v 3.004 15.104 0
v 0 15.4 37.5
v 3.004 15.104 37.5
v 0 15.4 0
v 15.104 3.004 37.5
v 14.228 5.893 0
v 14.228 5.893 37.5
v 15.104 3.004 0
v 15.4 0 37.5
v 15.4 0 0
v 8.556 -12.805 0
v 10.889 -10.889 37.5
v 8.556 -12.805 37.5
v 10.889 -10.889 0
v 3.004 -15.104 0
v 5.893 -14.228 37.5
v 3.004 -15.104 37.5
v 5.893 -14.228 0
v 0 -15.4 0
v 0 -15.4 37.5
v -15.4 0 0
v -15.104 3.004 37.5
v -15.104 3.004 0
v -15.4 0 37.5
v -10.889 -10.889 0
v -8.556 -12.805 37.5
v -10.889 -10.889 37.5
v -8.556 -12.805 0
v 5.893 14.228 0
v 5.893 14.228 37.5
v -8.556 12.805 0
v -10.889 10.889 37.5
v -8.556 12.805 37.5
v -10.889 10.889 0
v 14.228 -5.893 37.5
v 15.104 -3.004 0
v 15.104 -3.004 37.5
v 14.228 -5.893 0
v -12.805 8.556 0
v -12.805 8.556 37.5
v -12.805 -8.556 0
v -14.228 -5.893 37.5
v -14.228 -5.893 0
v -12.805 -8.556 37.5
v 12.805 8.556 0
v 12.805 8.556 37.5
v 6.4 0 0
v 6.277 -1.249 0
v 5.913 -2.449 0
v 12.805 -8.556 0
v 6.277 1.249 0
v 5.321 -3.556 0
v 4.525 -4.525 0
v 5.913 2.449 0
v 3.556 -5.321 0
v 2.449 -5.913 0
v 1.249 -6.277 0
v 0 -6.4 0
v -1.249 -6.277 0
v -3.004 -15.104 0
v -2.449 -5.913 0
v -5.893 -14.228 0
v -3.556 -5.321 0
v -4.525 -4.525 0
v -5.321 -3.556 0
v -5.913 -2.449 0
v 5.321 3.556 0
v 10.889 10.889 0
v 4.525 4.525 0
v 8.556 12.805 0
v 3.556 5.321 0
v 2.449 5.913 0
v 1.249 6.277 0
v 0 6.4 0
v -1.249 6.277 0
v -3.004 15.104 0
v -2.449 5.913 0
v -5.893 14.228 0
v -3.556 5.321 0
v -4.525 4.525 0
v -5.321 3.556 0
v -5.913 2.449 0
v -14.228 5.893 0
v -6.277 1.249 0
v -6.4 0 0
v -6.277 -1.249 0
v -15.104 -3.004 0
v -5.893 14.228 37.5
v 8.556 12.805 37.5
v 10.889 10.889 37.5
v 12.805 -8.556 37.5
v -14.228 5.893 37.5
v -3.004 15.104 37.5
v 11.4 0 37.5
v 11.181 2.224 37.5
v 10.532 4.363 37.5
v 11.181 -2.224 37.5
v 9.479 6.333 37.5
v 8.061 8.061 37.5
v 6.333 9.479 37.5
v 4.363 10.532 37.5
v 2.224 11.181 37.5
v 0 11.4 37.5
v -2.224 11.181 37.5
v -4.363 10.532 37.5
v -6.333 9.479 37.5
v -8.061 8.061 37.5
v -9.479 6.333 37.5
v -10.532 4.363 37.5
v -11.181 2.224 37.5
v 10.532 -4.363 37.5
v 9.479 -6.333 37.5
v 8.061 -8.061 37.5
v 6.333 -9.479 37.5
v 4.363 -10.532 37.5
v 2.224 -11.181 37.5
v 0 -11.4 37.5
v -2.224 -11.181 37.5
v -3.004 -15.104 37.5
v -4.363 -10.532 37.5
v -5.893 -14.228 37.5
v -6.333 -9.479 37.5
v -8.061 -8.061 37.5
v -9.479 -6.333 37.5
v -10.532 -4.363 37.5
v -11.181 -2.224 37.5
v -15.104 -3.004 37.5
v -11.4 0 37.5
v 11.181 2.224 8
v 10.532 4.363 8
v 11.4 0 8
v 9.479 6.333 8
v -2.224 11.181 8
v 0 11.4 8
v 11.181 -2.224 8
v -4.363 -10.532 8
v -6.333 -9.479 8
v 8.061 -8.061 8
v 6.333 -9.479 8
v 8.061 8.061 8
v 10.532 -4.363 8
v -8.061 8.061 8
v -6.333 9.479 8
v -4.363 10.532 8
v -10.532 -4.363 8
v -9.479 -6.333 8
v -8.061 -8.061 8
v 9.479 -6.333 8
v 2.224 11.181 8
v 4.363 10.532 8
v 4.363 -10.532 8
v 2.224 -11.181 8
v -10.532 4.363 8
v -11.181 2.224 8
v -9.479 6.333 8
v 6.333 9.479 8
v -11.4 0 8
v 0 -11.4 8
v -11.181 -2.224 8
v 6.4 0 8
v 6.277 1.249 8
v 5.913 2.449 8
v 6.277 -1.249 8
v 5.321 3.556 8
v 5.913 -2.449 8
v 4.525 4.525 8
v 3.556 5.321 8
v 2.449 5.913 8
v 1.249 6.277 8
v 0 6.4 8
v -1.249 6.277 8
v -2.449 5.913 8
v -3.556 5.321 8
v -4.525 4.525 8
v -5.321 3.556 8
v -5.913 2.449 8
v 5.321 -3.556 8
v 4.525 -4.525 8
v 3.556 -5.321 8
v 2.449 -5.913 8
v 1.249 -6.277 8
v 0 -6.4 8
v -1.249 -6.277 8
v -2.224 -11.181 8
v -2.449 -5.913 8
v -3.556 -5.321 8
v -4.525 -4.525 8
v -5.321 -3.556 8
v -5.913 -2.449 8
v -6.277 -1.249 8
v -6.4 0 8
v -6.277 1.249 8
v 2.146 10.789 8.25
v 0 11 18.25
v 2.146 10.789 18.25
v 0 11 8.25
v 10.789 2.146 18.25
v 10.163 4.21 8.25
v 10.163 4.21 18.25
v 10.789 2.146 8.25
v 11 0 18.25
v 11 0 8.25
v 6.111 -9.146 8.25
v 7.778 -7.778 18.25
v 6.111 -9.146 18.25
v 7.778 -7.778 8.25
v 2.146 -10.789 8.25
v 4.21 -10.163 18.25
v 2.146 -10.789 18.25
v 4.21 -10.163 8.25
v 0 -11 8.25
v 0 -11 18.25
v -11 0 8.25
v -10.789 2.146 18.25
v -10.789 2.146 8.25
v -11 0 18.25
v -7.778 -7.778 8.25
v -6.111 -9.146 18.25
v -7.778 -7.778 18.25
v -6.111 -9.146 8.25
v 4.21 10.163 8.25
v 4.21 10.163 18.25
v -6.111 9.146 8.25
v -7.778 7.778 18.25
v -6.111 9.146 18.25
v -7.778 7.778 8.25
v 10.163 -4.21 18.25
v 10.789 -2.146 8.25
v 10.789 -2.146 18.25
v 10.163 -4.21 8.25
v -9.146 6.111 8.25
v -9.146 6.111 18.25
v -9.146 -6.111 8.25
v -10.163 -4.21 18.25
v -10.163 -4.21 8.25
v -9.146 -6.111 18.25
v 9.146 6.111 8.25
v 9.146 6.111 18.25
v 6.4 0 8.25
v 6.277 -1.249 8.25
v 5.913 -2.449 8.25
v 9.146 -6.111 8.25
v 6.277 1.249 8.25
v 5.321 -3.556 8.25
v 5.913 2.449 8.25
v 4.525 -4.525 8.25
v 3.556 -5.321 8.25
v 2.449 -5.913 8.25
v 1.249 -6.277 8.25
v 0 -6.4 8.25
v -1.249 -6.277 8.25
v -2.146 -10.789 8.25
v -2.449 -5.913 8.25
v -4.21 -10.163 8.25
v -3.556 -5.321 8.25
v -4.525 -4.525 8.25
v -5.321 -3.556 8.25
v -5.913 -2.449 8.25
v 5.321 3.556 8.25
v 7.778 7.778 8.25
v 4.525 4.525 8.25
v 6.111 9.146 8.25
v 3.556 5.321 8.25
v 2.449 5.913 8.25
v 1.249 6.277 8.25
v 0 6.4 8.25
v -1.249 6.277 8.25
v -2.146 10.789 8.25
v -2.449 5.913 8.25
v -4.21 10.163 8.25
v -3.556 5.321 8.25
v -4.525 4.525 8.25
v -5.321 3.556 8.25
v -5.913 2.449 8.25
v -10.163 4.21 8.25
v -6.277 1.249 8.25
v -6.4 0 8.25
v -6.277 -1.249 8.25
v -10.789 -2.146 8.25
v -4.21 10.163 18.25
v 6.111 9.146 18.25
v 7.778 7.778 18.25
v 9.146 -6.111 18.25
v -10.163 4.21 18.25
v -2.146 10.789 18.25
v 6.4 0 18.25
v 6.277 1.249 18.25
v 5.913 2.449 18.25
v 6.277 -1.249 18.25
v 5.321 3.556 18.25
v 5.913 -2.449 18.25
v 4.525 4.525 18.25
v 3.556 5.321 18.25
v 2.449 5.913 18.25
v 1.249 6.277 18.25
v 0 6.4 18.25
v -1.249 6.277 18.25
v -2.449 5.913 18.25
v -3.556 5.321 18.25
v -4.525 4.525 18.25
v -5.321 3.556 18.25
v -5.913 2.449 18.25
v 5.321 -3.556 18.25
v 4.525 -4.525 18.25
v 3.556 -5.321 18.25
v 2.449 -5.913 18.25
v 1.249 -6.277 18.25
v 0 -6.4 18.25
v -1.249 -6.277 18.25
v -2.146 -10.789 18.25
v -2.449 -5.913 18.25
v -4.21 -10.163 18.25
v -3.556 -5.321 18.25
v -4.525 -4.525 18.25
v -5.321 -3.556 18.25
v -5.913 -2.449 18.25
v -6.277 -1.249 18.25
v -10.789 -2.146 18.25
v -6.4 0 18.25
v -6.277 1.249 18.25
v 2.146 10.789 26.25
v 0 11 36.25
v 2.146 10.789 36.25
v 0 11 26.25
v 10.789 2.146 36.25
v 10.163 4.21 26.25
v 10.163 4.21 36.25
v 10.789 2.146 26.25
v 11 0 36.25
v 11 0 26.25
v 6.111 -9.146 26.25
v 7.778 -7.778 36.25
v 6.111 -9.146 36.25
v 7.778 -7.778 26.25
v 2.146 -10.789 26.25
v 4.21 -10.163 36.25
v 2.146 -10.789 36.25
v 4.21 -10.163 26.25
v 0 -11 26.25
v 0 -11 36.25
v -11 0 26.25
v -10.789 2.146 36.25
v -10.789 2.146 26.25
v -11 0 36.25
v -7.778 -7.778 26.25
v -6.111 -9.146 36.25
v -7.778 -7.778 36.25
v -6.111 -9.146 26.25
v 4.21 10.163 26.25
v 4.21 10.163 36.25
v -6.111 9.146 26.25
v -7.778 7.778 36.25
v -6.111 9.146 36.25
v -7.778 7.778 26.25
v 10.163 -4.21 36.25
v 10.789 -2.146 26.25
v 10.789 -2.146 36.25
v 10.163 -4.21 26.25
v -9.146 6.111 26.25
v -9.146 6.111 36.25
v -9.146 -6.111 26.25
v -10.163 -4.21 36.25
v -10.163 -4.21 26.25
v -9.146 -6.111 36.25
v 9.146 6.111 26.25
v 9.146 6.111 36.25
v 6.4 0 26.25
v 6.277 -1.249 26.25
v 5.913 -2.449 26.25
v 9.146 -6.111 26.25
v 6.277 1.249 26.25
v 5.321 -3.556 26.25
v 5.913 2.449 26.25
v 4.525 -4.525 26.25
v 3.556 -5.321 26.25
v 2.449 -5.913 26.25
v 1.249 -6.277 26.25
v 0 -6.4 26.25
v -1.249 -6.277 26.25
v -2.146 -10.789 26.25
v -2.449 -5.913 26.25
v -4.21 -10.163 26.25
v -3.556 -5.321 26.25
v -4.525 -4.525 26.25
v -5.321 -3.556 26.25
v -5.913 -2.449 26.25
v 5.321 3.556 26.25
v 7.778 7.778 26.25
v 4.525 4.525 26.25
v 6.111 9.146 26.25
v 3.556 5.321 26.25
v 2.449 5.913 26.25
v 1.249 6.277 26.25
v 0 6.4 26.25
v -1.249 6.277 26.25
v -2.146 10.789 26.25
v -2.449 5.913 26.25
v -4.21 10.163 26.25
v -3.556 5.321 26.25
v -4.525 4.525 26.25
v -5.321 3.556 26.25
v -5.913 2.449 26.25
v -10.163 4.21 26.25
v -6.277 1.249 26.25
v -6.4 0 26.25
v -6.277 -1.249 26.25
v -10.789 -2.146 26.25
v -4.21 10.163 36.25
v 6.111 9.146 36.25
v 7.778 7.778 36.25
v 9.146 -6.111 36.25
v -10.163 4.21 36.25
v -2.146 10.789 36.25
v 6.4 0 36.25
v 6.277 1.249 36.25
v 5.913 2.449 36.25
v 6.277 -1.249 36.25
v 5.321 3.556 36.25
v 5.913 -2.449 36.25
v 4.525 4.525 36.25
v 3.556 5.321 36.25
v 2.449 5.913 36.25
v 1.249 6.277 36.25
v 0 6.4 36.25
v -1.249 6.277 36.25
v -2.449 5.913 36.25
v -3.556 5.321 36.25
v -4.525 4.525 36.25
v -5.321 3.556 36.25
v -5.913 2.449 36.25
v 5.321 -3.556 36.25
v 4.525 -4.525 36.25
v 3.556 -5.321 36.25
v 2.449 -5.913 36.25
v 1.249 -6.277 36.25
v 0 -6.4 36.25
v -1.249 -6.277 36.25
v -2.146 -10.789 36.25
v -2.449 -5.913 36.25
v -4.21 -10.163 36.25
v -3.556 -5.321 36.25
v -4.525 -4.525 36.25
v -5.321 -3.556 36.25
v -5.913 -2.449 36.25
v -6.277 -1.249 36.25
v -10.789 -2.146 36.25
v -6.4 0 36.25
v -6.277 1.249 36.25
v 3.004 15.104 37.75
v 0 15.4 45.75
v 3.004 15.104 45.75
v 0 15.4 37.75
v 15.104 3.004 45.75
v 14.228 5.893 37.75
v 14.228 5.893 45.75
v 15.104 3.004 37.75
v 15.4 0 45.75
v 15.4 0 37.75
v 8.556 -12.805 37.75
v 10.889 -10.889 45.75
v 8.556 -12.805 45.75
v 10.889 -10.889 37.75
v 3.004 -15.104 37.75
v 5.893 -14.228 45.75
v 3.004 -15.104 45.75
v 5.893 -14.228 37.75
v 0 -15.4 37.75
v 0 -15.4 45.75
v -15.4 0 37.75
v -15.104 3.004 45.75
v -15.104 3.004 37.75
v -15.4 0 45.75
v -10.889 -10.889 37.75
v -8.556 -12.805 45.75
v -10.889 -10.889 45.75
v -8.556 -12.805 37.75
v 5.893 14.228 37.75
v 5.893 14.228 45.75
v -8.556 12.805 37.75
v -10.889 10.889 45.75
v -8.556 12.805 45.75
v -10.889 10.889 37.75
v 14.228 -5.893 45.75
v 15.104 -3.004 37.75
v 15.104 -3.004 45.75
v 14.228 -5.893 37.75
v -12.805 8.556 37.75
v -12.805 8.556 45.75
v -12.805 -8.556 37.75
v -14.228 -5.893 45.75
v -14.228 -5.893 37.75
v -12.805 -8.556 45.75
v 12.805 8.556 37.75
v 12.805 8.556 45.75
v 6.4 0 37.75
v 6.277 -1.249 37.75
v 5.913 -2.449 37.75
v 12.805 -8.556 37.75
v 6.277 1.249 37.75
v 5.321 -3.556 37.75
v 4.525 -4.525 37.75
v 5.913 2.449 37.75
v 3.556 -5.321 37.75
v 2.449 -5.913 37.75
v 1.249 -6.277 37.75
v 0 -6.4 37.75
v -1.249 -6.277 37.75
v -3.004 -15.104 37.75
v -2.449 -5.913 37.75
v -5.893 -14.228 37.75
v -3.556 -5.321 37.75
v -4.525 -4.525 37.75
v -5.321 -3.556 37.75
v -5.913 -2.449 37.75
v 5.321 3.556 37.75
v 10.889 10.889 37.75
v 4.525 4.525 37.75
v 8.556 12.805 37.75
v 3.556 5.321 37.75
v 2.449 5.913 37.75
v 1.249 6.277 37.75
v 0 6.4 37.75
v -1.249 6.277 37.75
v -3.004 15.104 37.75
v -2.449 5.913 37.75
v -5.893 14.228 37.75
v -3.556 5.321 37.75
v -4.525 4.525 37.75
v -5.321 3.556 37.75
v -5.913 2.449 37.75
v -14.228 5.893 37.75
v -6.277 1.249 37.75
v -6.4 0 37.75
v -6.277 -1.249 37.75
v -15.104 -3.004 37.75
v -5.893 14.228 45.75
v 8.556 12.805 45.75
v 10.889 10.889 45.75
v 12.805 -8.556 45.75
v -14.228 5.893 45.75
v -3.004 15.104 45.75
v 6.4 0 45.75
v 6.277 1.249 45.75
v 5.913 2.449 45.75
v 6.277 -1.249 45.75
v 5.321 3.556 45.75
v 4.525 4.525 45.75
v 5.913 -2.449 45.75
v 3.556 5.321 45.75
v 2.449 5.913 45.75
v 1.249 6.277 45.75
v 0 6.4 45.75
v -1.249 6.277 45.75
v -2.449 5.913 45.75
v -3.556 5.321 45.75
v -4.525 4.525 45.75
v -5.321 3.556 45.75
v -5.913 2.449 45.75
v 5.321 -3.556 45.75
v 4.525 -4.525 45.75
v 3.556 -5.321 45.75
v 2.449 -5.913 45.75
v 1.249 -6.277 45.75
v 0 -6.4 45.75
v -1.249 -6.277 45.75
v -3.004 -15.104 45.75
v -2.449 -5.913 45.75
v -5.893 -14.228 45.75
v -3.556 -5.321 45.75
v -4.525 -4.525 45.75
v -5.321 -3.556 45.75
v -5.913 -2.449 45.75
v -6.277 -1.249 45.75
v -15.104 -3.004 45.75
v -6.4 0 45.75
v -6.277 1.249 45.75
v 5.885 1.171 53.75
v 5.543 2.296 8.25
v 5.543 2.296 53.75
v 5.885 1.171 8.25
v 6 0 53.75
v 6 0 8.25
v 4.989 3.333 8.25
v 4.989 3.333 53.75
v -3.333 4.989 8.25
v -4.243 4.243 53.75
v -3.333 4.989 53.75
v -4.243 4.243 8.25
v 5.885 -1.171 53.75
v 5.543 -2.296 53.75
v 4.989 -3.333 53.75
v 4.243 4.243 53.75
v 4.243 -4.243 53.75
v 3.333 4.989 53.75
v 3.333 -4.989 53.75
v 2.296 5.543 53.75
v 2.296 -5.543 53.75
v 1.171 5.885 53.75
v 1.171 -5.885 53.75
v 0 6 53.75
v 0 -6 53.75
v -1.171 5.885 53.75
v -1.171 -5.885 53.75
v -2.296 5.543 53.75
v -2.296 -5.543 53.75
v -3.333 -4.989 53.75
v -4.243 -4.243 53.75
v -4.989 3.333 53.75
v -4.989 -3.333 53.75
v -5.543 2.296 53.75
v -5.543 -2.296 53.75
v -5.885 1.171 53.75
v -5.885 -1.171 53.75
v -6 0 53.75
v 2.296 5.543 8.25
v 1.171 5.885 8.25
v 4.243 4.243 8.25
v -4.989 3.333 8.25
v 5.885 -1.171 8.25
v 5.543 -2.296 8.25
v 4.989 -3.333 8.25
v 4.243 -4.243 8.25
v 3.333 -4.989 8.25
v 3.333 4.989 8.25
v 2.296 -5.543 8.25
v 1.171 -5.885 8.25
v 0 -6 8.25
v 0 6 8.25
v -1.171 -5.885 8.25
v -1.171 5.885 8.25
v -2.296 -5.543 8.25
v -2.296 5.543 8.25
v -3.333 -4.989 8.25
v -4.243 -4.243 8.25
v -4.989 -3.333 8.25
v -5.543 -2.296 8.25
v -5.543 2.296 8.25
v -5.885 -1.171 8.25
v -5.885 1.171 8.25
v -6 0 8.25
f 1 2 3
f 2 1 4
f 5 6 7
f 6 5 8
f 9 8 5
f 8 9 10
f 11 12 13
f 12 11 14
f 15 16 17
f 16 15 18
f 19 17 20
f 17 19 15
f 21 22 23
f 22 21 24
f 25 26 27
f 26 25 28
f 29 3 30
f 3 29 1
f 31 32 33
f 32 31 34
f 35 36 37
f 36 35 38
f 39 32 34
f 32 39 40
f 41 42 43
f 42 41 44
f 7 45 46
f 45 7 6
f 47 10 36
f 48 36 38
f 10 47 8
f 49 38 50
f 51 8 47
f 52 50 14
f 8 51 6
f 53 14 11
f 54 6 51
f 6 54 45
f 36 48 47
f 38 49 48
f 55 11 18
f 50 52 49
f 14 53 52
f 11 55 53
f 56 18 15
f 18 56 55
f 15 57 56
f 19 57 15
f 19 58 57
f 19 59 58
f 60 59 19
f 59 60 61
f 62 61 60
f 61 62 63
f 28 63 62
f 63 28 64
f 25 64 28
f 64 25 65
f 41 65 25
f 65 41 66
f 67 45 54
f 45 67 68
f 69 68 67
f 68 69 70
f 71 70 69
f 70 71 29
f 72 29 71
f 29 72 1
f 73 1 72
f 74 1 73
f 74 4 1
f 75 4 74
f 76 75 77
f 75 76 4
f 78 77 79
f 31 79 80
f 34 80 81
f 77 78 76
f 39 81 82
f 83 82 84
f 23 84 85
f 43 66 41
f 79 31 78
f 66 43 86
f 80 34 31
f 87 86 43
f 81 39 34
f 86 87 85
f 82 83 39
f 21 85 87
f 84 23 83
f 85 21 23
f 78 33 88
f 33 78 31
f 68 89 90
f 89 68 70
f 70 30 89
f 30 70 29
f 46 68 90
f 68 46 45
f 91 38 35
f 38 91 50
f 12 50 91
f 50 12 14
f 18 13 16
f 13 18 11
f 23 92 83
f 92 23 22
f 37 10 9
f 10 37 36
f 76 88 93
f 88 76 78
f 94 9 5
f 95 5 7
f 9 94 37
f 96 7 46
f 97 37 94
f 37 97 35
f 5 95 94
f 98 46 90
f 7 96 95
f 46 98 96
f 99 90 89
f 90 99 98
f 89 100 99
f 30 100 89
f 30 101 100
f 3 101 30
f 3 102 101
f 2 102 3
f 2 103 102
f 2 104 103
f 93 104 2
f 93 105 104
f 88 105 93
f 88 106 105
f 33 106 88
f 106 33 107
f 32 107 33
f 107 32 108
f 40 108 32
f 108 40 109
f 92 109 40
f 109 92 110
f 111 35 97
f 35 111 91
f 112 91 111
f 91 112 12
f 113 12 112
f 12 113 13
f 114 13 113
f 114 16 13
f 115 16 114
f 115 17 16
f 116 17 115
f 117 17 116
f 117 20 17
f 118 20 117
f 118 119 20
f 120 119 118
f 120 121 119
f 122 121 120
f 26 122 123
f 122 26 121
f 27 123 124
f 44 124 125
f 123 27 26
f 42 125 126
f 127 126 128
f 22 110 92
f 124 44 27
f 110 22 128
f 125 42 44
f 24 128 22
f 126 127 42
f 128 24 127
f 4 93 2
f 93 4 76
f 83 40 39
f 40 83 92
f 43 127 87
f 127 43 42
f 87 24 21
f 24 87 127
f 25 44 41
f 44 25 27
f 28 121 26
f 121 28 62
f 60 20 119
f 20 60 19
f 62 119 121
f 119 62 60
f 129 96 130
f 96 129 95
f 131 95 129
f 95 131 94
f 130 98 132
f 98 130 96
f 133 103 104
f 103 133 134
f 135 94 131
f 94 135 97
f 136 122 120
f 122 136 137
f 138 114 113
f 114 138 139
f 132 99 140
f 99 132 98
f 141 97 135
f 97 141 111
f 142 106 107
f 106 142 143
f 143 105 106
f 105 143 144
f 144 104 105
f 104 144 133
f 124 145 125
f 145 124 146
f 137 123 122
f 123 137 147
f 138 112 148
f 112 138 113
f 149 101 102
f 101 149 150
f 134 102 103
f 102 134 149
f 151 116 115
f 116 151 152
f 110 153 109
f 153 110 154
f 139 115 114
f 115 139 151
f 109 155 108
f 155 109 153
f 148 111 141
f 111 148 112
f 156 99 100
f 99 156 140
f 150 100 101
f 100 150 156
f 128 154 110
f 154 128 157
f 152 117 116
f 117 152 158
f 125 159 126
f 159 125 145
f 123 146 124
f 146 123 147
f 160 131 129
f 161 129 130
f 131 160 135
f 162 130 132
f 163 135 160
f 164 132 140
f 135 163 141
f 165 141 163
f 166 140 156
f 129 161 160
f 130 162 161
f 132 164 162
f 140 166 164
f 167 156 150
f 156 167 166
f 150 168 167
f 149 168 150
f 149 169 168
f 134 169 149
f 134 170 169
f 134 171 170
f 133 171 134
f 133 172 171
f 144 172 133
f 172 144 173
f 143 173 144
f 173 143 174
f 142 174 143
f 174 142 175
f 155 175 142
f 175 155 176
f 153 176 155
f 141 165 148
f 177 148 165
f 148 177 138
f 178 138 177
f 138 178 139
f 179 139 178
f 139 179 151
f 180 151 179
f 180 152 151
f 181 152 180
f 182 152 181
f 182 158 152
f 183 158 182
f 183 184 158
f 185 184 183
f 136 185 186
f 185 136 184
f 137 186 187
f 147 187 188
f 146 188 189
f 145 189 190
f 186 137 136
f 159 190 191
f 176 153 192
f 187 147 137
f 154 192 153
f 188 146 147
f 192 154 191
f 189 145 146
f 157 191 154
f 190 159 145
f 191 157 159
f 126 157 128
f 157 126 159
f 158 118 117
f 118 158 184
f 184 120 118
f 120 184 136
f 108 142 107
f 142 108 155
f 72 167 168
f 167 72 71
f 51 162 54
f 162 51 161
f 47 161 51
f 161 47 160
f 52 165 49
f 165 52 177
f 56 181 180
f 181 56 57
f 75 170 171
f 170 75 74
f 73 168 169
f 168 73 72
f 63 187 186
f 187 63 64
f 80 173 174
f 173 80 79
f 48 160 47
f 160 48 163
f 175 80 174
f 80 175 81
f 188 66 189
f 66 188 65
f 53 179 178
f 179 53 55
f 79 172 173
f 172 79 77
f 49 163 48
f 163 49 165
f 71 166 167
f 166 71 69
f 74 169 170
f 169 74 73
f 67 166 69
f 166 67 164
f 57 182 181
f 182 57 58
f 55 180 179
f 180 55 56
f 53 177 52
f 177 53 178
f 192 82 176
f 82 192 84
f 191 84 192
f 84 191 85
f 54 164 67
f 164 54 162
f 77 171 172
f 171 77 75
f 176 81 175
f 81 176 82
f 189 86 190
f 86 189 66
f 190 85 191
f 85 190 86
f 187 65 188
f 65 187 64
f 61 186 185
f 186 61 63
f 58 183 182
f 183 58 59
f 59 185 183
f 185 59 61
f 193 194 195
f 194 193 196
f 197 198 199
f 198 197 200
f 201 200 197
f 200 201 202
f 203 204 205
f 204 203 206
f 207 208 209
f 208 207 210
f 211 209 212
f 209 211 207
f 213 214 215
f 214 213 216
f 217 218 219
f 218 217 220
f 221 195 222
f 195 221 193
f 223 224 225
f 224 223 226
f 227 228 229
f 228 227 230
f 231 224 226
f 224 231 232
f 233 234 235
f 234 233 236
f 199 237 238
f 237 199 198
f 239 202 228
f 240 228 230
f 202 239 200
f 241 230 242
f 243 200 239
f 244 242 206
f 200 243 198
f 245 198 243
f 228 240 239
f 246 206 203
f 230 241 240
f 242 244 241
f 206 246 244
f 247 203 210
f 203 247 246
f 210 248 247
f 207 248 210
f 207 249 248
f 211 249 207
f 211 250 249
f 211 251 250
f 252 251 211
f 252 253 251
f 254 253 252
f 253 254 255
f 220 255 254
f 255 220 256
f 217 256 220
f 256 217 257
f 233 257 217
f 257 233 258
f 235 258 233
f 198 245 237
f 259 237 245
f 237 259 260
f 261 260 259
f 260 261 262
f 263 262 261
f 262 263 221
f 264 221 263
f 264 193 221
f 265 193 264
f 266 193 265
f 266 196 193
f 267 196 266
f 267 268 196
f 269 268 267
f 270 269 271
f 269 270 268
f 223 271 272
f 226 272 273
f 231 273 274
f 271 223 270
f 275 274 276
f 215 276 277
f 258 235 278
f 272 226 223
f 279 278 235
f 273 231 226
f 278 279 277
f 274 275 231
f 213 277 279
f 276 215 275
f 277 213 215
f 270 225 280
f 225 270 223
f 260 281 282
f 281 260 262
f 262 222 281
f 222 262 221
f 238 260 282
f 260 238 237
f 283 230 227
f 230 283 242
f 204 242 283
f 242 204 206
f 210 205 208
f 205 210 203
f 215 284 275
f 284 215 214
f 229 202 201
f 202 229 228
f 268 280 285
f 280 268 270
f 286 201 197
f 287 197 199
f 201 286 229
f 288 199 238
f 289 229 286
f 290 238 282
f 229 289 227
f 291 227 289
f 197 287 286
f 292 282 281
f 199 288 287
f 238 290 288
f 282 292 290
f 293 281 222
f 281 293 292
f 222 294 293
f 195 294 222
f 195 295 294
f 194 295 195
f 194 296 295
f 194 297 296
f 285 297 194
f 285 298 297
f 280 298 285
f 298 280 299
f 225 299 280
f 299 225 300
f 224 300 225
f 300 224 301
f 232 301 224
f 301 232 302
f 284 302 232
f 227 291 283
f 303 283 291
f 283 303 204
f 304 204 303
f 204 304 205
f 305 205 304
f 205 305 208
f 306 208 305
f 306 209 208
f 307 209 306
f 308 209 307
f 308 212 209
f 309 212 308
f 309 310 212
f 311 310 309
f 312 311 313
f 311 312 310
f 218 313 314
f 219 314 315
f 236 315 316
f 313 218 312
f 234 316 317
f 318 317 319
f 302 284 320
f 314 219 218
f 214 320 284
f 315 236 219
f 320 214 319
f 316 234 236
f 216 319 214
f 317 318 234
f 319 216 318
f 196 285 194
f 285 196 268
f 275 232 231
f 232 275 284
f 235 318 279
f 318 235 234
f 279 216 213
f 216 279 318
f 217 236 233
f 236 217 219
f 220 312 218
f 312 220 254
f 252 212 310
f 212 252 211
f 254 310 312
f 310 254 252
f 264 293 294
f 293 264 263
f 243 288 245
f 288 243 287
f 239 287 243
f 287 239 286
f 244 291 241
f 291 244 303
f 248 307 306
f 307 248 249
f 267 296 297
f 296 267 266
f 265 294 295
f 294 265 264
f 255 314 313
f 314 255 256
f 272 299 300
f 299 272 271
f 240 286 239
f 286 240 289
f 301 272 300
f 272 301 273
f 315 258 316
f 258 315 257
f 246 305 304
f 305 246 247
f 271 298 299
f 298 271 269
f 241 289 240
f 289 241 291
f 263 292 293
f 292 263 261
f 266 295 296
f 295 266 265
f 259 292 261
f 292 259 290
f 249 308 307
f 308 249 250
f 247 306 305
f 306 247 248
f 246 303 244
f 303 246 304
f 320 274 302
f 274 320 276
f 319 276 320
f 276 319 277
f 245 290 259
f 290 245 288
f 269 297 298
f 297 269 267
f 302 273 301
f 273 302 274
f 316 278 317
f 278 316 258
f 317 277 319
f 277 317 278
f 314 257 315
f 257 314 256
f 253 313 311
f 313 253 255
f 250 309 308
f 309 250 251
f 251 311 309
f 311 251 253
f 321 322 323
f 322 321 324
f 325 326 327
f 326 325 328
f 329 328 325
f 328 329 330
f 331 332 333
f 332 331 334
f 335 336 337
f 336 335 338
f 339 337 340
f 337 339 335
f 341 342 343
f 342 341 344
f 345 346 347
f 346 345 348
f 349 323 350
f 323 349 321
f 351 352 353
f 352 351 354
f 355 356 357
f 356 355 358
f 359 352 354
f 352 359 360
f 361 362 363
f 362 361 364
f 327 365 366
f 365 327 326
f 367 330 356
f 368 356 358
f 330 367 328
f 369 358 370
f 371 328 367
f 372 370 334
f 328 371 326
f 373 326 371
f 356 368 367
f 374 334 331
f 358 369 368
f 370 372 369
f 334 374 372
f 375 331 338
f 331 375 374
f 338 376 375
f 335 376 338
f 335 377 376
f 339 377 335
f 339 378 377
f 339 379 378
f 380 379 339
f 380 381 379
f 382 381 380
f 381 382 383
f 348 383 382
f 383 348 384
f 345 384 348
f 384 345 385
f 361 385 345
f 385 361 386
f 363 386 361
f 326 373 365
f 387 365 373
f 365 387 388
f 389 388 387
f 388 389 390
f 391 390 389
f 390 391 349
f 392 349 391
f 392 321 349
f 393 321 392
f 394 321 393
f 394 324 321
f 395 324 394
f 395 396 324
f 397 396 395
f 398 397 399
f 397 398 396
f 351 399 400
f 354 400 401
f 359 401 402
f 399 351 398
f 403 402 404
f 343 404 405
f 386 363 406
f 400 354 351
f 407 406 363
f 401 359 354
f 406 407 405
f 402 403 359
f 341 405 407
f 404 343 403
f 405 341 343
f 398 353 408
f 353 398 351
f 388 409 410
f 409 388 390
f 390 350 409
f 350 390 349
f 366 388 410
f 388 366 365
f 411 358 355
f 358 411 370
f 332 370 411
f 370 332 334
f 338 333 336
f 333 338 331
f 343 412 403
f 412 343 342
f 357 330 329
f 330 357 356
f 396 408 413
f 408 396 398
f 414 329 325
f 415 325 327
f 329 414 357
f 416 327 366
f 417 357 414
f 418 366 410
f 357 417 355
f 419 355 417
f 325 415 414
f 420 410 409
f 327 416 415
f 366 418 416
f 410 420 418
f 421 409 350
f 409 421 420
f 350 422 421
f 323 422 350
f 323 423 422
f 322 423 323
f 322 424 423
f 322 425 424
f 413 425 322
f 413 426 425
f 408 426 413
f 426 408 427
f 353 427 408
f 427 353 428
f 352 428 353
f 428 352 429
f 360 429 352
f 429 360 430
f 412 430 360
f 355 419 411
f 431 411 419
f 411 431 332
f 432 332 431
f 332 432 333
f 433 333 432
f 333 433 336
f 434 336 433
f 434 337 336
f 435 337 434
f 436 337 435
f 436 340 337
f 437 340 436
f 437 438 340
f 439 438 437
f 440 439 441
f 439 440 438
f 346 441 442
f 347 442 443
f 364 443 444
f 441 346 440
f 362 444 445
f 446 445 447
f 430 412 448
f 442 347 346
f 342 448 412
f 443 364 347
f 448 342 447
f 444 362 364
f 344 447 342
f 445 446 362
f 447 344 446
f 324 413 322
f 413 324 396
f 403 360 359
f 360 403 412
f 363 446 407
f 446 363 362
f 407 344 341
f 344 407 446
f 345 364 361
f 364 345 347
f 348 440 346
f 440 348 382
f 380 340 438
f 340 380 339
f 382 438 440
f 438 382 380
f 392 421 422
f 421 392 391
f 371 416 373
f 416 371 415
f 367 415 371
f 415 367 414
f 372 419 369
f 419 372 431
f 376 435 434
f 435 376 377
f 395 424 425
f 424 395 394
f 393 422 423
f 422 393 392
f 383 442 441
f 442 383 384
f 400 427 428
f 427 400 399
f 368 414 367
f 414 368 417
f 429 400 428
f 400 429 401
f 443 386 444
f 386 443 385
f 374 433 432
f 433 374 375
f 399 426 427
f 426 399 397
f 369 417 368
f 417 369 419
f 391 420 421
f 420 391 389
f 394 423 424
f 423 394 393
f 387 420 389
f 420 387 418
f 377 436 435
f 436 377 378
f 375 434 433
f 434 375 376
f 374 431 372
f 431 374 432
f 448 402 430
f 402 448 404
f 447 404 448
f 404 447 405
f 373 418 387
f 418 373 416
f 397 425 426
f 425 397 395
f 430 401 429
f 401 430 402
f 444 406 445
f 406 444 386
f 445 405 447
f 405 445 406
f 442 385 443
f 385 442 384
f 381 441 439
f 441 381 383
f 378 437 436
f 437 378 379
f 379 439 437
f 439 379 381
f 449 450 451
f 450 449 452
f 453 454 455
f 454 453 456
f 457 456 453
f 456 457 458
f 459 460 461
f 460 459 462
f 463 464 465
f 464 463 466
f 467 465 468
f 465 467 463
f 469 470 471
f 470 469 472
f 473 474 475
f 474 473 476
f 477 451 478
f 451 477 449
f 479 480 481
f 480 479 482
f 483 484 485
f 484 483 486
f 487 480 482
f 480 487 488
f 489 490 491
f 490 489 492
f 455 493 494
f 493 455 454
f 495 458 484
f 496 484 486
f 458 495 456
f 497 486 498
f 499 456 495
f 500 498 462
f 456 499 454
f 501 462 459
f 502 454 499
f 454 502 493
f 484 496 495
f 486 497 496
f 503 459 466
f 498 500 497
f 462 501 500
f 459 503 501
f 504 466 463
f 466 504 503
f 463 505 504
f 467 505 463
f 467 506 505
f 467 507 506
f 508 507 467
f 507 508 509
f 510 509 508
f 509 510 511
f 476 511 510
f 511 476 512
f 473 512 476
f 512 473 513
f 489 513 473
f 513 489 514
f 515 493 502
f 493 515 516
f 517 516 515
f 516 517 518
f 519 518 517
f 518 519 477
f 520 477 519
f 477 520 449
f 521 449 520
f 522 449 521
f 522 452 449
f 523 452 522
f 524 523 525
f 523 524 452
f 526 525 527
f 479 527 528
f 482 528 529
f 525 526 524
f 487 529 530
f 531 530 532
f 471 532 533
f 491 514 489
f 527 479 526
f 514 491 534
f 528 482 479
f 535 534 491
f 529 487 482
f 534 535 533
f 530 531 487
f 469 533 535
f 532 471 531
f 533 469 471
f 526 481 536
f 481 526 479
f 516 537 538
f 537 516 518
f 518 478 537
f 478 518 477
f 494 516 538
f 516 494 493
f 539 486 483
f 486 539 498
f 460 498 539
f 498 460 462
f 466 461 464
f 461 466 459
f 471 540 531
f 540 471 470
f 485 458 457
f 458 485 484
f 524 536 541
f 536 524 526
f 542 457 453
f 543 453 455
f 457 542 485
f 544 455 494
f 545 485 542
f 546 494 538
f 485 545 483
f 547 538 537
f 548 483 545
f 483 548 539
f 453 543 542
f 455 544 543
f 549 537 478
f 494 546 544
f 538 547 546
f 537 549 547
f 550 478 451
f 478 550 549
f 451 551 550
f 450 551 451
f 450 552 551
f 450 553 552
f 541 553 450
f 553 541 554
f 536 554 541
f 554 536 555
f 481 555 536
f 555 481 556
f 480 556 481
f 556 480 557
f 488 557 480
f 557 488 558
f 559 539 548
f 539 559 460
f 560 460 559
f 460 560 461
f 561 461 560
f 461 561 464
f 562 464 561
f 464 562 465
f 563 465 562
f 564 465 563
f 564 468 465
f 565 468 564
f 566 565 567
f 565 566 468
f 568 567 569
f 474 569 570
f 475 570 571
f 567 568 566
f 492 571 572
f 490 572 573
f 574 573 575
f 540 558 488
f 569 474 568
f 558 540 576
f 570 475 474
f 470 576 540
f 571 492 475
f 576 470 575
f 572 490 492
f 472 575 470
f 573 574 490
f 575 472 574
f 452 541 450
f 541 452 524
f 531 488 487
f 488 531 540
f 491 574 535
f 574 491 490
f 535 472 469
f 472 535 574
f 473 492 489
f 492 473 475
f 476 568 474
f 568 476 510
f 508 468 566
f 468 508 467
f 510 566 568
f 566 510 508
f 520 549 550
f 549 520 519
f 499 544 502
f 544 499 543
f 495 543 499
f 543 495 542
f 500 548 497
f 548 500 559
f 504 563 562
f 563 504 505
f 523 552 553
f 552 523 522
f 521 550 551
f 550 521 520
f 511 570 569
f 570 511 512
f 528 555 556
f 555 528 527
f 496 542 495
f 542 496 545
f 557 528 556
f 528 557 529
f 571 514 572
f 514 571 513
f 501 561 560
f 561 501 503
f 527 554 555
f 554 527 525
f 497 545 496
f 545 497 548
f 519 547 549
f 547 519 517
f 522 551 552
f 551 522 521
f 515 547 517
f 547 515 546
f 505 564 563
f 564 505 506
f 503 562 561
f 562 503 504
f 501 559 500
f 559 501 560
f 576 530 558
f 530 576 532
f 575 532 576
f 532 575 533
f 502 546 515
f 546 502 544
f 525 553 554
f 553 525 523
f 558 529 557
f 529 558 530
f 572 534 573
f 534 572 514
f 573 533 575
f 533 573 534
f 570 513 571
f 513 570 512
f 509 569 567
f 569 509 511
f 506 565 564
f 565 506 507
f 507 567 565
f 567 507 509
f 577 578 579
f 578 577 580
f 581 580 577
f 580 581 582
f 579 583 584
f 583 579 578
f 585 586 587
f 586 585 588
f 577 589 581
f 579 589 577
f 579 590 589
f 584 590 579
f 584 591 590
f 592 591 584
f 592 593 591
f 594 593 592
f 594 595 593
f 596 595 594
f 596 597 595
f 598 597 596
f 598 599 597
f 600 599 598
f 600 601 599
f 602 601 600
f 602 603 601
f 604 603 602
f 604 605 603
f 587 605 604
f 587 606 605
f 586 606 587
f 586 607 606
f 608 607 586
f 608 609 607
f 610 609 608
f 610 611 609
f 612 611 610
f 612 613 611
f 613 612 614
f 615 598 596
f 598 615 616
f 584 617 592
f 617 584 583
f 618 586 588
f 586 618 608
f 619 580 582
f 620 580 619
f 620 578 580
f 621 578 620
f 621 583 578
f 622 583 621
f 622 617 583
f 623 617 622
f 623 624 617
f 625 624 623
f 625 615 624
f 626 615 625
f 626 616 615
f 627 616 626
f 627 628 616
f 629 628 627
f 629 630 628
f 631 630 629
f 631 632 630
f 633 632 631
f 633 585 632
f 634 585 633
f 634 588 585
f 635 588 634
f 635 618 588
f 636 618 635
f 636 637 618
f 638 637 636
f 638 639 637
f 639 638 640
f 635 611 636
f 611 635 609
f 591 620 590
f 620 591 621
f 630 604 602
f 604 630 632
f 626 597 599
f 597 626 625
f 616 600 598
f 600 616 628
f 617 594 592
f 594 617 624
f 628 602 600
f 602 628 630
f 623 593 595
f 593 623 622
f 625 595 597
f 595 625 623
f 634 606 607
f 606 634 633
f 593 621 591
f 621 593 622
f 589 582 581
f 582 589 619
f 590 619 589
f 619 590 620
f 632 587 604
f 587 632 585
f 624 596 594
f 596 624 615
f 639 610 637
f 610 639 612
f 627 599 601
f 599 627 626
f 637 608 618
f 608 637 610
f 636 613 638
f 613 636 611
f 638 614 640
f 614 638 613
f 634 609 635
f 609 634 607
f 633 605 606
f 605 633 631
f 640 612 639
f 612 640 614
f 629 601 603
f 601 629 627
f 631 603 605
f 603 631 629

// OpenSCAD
$fn = 32;

// ------------------------------------------------------------------------
// Shaft station: cup d30.8 x 37.5 mm, shaft d12
// Every part is its own module, assembly() places every instance.
// ------------------------------------------------------------------------

// --- part 1 ---
module housing_cup() {
  difference() {
    cylinder(h = 37.5, d = 30.8);
    translate([0, 0, 8]) cylinder(h = 30.5, d = 22.8);
    translate([0, 0, -1]) cylinder(h = 10, d = 12.8);
  }
}

// --- part 2 ---
module bearing_lower() {
  difference() {
      translate([0, 0, 0]) cylinder(h = 10, d = 22);
      translate([0, 0, -1]) cylinder(h = 12, d = 12.8);
    }
}

// --- part 3 ---
module bearing_upper() {
  difference() {
      translate([0, 0, 0]) cylinder(h = 10, d = 22);
      translate([0, 0, -1]) cylinder(h = 12, d = 12.8);
    }
}

// --- part 4 ---
module station_shaft() {
  translate([0, 0, -22.75]) cylinder(h = 45.5, d = 12);
}

// --- part 5 ---
module station_cover() {
  difference() {
    cylinder(h = 8, d = 30.8);
    translate([0, 0, -1]) cylinder(h = 10, d = 12.8);
  }
}

// --- assembly ---
module assembly() {
  color([0.80, 0.24, 0.20]) translate([0, 0, 0]) rotate([0, 0, 0]) housing_cup();
  color([0.20, 0.45, 0.75]) translate([0, 0, 8.25]) rotate([0, 0, 0]) bearing_lower();
  color([0.25, 0.62, 0.32]) translate([0, 0, 26.25]) rotate([0, 0, 0]) bearing_upper();
  color([0.92, 0.70, 0.18]) translate([0, 0, 31]) rotate([0, 0, 0]) station_shaft();
  color([0.58, 0.35, 0.70]) translate([0, 0, 37.75]) rotate([0, 0, 0]) station_cover();
}

assembly();
